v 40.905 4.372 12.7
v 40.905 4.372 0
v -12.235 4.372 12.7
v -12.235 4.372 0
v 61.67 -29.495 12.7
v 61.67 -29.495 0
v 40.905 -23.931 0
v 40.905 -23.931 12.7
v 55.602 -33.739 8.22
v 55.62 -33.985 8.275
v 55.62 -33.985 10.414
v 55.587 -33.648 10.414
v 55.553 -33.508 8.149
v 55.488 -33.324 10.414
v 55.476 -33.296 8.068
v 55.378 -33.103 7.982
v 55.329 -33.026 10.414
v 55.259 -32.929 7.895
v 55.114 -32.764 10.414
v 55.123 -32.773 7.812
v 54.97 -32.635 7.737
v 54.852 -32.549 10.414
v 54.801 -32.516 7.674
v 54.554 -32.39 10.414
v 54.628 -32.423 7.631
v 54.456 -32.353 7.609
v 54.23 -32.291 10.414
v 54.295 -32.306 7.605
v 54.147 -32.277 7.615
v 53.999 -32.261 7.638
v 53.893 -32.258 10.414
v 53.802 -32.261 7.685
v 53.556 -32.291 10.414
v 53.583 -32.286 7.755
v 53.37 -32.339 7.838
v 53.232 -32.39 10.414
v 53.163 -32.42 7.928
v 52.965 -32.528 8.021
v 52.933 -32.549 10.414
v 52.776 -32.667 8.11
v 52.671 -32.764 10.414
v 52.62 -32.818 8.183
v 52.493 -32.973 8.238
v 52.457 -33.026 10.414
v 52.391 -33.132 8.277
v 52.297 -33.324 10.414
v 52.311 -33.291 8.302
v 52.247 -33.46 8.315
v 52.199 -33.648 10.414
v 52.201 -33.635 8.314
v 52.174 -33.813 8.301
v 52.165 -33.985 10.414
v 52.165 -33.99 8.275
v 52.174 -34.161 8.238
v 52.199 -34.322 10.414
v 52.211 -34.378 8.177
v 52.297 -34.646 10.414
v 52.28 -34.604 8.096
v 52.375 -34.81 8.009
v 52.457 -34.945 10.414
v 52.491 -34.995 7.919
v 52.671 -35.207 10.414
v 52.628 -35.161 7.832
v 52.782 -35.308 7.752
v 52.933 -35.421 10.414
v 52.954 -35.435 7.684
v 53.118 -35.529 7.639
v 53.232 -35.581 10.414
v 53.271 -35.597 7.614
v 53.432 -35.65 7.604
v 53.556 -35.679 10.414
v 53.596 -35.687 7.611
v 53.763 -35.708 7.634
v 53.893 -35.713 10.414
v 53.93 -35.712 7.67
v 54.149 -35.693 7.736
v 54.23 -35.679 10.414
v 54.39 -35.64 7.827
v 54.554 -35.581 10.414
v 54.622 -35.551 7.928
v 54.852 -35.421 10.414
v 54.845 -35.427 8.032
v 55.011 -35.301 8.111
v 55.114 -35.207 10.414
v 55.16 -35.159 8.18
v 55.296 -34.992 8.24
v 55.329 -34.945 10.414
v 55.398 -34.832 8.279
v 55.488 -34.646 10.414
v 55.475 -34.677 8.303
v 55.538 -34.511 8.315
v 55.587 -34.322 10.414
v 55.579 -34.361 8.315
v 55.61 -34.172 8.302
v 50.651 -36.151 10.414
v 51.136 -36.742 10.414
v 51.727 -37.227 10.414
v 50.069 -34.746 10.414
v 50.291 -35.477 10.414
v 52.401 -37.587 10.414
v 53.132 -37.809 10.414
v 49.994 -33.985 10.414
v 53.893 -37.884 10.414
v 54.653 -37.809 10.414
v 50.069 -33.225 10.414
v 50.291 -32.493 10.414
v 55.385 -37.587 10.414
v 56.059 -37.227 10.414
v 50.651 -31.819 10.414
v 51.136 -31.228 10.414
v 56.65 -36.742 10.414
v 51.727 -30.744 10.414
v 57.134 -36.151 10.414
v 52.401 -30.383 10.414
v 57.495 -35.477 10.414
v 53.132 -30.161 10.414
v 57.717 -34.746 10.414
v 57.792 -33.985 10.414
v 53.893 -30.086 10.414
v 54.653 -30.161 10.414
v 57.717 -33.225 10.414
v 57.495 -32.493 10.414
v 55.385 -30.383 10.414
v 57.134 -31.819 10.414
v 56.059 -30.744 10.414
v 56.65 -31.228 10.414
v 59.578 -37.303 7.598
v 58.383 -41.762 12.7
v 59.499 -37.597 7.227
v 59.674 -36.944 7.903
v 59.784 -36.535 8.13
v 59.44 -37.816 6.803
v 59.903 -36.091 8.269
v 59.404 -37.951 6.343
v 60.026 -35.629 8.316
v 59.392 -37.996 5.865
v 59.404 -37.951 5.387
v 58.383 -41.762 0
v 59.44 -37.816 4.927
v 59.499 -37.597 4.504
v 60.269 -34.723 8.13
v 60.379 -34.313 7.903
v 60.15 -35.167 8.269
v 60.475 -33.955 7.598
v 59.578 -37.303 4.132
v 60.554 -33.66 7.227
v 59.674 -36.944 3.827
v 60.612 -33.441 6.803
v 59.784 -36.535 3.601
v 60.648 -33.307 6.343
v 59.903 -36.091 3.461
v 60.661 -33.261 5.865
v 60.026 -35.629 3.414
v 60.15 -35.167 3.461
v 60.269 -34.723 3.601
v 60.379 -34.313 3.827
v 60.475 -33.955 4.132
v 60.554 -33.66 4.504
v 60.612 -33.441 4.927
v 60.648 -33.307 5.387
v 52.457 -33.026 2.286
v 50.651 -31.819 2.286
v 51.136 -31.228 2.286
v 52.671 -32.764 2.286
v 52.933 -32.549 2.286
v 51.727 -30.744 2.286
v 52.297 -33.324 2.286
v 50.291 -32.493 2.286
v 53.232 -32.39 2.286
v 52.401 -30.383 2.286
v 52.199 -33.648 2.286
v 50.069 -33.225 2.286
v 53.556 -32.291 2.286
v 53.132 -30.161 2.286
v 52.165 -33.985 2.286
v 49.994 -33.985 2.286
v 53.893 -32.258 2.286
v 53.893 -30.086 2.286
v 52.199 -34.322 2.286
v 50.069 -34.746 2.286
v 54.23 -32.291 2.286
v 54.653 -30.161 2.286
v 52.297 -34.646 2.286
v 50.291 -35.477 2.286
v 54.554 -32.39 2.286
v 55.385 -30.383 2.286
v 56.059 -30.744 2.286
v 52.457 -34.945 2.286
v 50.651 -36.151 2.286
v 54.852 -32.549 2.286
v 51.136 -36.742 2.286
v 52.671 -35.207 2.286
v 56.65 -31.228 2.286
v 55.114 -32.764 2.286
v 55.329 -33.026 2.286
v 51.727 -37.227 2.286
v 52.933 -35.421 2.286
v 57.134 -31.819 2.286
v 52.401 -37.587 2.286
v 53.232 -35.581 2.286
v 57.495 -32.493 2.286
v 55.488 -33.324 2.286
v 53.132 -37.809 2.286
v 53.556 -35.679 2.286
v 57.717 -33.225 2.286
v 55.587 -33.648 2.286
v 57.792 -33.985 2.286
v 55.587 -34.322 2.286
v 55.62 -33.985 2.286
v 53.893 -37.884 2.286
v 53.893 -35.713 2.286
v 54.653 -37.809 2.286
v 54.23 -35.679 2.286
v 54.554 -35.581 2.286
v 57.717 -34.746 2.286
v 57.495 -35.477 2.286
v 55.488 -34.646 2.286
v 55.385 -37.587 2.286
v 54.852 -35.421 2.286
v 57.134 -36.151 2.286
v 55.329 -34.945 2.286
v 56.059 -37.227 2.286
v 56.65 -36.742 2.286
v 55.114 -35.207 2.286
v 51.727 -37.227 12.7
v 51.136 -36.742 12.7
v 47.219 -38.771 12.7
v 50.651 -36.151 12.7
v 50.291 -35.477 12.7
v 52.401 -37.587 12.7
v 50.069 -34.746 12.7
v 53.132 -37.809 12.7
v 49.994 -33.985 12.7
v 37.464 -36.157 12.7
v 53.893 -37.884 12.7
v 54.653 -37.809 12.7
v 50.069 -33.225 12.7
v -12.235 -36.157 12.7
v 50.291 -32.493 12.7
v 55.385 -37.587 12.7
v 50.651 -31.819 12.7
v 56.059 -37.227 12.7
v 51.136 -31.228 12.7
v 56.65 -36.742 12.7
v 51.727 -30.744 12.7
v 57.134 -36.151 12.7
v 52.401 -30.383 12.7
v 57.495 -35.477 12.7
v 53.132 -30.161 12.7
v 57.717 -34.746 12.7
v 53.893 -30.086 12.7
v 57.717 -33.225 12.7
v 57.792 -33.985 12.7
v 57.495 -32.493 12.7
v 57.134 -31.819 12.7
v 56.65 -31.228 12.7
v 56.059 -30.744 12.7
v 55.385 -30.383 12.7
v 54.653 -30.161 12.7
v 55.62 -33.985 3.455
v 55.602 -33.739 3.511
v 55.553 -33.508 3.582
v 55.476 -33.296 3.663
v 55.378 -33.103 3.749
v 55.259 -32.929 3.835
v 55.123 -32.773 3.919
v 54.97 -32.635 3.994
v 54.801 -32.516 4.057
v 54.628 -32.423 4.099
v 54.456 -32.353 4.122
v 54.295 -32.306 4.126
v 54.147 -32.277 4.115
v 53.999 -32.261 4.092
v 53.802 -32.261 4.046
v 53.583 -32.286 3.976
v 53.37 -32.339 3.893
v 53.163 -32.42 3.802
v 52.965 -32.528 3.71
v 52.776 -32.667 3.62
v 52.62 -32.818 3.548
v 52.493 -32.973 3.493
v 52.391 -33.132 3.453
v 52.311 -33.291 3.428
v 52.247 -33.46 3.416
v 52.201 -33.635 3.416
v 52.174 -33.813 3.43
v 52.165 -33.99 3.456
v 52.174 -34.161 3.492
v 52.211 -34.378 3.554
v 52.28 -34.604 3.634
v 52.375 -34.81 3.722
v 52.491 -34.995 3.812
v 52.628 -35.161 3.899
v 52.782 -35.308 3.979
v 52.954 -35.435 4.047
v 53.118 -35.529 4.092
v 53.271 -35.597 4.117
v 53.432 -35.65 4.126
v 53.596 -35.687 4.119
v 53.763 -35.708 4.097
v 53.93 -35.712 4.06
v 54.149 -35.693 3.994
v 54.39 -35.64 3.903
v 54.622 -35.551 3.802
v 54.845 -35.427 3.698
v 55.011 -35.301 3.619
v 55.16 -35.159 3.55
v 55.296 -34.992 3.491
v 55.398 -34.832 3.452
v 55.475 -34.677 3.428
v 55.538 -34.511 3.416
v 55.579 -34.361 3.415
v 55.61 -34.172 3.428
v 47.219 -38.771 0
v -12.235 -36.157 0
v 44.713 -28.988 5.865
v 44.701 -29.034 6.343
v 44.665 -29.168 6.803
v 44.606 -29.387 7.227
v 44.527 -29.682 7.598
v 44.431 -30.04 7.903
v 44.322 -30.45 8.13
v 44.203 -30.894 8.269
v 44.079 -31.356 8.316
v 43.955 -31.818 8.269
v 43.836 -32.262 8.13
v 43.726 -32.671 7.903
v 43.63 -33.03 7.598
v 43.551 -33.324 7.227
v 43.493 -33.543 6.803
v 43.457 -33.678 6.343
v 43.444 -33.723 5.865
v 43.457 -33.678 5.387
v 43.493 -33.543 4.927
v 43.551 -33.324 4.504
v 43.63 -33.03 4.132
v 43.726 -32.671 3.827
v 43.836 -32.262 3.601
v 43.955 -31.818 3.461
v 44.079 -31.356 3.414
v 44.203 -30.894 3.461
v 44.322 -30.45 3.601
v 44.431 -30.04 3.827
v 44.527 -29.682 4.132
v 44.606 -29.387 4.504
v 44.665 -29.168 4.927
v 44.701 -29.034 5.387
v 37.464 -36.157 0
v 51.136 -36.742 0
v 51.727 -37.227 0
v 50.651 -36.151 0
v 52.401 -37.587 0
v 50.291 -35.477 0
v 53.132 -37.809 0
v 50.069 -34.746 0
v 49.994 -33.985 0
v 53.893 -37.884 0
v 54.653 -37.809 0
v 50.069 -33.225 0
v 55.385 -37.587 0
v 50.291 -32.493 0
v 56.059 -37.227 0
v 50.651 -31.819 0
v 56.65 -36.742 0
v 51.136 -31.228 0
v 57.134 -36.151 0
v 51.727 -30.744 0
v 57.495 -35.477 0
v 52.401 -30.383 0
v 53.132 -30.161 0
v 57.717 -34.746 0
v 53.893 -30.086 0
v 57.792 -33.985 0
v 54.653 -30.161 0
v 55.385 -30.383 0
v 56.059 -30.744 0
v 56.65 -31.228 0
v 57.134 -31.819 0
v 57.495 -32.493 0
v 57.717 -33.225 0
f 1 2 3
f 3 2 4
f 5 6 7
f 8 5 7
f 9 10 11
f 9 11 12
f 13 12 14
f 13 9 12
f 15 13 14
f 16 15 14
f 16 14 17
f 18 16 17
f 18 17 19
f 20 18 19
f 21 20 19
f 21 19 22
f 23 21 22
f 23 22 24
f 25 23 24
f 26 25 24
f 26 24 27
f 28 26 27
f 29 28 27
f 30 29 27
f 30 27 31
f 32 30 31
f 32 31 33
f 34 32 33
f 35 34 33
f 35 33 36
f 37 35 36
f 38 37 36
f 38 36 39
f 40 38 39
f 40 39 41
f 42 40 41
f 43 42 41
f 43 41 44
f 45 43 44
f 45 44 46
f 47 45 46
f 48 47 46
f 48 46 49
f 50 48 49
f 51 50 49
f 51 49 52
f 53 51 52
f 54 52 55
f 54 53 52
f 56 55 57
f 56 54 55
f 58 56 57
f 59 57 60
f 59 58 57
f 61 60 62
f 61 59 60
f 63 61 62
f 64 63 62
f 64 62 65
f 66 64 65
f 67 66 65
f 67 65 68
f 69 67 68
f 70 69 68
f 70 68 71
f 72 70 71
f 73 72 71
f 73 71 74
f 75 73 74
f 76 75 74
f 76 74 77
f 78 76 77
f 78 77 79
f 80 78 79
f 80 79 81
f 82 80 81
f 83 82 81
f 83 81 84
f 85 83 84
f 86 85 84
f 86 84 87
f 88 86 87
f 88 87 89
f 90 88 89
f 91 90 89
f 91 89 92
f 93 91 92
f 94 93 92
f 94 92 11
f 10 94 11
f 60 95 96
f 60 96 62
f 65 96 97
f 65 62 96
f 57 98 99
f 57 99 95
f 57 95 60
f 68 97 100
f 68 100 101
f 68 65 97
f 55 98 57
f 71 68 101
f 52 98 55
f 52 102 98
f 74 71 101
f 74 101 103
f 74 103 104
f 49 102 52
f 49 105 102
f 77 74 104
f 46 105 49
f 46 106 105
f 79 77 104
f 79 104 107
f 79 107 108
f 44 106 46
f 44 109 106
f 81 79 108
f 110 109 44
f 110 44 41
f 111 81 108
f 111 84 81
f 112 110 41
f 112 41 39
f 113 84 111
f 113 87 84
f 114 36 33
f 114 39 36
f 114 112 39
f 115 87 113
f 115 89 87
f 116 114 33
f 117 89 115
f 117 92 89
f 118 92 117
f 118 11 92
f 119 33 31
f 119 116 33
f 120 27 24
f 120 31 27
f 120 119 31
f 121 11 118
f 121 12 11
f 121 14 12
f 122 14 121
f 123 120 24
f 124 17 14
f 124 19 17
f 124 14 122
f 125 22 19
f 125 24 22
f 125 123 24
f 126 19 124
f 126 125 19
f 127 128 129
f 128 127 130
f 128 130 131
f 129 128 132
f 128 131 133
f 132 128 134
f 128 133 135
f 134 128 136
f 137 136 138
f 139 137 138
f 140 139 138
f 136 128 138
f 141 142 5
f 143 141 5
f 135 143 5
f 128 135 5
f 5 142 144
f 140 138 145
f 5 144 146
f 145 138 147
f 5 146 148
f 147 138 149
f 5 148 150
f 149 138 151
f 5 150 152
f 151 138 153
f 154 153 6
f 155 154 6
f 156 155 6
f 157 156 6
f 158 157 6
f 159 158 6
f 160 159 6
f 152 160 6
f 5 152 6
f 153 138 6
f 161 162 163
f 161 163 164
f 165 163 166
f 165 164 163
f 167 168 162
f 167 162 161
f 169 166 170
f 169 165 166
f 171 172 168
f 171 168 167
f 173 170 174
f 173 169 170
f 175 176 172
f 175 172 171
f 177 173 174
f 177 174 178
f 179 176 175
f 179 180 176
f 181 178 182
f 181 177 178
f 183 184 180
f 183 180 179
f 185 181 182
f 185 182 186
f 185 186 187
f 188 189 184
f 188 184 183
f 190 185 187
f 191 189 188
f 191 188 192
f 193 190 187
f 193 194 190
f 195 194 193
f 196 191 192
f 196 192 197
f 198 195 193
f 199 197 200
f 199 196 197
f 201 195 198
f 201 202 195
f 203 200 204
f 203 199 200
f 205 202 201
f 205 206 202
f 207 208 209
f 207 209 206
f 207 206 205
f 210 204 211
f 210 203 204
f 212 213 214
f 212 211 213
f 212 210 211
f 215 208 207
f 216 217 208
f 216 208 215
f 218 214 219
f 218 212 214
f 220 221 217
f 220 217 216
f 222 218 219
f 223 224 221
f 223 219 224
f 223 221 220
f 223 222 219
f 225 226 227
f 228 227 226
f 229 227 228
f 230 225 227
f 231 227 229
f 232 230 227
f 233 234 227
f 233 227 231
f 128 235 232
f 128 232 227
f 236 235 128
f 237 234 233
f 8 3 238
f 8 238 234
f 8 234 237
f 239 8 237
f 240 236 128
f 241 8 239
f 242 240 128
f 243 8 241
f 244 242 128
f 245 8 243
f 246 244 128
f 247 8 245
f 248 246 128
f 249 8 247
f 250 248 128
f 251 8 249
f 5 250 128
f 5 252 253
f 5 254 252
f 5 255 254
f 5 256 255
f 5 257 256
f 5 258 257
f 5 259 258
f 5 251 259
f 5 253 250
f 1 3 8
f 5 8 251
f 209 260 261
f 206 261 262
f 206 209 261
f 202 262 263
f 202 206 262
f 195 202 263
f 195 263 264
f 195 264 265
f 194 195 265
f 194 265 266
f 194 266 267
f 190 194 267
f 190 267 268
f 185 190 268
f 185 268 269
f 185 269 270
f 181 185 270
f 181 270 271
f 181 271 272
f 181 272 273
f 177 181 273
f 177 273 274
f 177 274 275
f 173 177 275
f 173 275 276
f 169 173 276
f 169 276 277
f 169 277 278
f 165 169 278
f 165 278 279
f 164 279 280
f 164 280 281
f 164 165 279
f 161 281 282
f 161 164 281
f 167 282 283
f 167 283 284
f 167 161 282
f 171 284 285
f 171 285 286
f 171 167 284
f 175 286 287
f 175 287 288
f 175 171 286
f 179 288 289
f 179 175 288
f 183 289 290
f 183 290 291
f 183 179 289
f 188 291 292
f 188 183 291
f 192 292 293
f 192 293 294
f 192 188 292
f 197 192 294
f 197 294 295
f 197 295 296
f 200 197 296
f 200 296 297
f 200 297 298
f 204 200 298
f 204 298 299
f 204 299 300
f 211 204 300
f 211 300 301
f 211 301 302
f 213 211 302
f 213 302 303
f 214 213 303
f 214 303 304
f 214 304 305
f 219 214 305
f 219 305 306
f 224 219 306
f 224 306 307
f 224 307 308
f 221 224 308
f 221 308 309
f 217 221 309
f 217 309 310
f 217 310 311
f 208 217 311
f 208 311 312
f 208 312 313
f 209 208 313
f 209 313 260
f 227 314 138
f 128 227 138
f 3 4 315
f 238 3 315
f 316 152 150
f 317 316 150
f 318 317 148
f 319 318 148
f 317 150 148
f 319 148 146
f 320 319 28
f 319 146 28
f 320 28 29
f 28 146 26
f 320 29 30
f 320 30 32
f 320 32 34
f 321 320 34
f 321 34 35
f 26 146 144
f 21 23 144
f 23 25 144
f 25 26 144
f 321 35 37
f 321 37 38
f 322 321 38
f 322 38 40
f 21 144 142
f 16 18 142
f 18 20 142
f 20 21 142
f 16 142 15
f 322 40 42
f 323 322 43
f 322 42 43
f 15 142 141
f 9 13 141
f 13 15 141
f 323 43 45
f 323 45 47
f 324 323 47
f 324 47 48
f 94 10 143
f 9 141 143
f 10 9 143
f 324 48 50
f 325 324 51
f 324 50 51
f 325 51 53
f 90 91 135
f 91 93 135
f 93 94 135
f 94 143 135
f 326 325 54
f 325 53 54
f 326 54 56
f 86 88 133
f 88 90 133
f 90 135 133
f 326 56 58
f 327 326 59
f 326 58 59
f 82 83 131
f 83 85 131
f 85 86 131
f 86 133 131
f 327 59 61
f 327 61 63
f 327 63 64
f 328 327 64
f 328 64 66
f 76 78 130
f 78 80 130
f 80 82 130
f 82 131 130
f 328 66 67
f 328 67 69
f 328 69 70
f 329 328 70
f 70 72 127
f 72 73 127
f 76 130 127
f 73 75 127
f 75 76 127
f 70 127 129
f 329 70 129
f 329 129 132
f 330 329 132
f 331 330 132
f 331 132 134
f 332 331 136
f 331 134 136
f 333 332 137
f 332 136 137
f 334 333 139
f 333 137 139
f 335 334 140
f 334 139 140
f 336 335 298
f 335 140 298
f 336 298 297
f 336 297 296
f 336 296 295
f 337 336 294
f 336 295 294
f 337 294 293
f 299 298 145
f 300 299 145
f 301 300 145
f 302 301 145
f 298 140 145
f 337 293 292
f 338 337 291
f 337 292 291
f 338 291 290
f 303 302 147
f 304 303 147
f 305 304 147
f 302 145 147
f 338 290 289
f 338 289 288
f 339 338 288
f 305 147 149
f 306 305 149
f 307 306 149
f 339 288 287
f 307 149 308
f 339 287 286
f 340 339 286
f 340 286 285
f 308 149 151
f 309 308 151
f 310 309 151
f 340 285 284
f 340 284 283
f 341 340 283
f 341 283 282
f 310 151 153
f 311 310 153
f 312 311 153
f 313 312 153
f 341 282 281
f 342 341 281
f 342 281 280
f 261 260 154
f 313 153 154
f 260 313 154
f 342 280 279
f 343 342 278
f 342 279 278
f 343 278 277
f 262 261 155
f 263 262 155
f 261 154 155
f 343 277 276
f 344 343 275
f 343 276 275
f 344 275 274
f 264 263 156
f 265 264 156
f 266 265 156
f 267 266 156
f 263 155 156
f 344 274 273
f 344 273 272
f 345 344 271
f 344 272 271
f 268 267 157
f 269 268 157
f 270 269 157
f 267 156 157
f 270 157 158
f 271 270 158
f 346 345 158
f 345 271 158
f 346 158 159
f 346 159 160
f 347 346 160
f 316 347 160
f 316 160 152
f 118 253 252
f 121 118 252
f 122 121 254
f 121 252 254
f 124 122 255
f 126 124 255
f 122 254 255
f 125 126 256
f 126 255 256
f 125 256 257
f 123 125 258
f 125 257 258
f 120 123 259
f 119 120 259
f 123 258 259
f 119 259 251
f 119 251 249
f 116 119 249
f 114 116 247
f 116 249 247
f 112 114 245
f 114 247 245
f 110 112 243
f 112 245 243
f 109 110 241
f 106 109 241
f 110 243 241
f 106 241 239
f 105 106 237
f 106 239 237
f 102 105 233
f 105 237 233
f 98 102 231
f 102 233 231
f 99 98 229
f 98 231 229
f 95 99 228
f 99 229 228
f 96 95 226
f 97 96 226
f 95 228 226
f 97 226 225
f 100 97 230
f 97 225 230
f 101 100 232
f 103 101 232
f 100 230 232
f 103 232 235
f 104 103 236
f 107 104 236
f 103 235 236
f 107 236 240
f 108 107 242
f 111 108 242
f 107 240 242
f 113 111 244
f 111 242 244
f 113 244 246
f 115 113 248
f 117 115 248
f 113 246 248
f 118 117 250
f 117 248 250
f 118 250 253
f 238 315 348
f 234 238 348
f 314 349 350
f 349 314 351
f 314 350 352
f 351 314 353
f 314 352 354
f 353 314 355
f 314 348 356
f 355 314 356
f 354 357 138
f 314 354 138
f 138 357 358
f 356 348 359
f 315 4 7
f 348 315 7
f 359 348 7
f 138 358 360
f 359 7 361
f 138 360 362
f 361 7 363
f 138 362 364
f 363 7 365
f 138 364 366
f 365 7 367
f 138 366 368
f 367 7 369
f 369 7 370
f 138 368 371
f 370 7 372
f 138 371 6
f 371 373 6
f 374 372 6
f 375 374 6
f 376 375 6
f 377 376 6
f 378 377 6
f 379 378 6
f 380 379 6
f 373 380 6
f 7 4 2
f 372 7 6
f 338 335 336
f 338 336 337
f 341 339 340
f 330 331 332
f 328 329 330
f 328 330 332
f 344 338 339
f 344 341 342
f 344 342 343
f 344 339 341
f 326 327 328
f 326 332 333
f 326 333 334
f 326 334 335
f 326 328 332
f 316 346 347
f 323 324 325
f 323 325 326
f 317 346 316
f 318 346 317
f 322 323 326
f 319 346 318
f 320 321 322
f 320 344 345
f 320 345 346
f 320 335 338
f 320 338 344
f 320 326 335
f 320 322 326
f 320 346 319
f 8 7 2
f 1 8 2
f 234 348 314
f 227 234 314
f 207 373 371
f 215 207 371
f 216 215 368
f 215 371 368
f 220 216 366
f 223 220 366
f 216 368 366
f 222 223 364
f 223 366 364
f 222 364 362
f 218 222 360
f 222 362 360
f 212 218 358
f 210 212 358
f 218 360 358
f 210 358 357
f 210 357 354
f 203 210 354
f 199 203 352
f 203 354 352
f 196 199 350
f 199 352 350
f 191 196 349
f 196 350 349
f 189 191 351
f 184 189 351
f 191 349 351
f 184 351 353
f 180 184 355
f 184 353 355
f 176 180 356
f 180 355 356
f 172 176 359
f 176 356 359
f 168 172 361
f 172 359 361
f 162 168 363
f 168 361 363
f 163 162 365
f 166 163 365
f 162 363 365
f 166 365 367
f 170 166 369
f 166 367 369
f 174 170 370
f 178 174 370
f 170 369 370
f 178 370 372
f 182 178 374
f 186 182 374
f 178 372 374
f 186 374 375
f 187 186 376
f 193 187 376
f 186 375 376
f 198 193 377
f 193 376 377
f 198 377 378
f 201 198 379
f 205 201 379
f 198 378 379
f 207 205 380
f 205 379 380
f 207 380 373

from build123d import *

# Parameters (mm, degrees)
F0_R     = 1.7272
F1_DEPTH = 12.7
F2_R     = 2.4511
F3_DEPTH = 16.51
F4_R     = 3.8989
F4_R_2   = 1.7272
F5_DEPTH = 2.286
F6_R     = 3.8989
F6_R_2   = 1.7272
F7_DEPTH = 2.286


with BuildPart() as f1:
    # F0 (on Top) → F1 (new body)
    with BuildSketch(Plane.XY):
        Polygon((40.905171, 4.372339), (-12.235096, 4.372339), (-12.235096, -11.662856), (-12.235096, -36.157189), (-1.651831, -36.157189), (37.463617, -36.157189), (47.219385, -38.77124), (58.382782, -41.762463), (61.669784, -29.495205), (40.905171, -23.931344), (40.905171, -11.662856), align=None)
        with Locations((53.892654, -33.985333)):
            Circle(F0_R, mode=Mode.SUBTRACT)
    extrude(amount=F1_DEPTH)

    # F2 (on face) → F3 (cut)
    with BuildSketch(Plane(origin=(64.912493, -17.39325, 0), x_dir=(0.258819, 0.965926, 0), z_dir=(0.965926, -0.258819, 0))):
        with Locations((-18.878866, 5.865277)):
            Circle(F2_R)
    extrude(amount=-F3_DEPTH, mode=Mode.SUBTRACT)

    # F4 (on face) → F5 (cut)
    with BuildSketch(Plane.XY.offset(12.7)):
        with Locations((53.892654, -33.985333)):
            Circle(F4_R)
        with Locations((53.892654, -33.985333)):
            Circle(F4_R_2, mode=Mode.SUBTRACT)
    extrude(amount=-F5_DEPTH, mode=Mode.SUBTRACT)

    # F6 (on face) → F7 (cut)
    with BuildSketch(Plane(origin=(0, 0, 0), x_dir=(1, 0, 0), z_dir=(0, 0, -1))):
        with Locations((53.892654, 33.985333)):
            Circle(F6_R)
        with Locations((53.892654, 33.985333)):
            Circle(F6_R_2, mode=Mode.SUBTRACT)
    extrude(amount=-F7_DEPTH, mode=Mode.SUBTRACT)


solid = f1.part
